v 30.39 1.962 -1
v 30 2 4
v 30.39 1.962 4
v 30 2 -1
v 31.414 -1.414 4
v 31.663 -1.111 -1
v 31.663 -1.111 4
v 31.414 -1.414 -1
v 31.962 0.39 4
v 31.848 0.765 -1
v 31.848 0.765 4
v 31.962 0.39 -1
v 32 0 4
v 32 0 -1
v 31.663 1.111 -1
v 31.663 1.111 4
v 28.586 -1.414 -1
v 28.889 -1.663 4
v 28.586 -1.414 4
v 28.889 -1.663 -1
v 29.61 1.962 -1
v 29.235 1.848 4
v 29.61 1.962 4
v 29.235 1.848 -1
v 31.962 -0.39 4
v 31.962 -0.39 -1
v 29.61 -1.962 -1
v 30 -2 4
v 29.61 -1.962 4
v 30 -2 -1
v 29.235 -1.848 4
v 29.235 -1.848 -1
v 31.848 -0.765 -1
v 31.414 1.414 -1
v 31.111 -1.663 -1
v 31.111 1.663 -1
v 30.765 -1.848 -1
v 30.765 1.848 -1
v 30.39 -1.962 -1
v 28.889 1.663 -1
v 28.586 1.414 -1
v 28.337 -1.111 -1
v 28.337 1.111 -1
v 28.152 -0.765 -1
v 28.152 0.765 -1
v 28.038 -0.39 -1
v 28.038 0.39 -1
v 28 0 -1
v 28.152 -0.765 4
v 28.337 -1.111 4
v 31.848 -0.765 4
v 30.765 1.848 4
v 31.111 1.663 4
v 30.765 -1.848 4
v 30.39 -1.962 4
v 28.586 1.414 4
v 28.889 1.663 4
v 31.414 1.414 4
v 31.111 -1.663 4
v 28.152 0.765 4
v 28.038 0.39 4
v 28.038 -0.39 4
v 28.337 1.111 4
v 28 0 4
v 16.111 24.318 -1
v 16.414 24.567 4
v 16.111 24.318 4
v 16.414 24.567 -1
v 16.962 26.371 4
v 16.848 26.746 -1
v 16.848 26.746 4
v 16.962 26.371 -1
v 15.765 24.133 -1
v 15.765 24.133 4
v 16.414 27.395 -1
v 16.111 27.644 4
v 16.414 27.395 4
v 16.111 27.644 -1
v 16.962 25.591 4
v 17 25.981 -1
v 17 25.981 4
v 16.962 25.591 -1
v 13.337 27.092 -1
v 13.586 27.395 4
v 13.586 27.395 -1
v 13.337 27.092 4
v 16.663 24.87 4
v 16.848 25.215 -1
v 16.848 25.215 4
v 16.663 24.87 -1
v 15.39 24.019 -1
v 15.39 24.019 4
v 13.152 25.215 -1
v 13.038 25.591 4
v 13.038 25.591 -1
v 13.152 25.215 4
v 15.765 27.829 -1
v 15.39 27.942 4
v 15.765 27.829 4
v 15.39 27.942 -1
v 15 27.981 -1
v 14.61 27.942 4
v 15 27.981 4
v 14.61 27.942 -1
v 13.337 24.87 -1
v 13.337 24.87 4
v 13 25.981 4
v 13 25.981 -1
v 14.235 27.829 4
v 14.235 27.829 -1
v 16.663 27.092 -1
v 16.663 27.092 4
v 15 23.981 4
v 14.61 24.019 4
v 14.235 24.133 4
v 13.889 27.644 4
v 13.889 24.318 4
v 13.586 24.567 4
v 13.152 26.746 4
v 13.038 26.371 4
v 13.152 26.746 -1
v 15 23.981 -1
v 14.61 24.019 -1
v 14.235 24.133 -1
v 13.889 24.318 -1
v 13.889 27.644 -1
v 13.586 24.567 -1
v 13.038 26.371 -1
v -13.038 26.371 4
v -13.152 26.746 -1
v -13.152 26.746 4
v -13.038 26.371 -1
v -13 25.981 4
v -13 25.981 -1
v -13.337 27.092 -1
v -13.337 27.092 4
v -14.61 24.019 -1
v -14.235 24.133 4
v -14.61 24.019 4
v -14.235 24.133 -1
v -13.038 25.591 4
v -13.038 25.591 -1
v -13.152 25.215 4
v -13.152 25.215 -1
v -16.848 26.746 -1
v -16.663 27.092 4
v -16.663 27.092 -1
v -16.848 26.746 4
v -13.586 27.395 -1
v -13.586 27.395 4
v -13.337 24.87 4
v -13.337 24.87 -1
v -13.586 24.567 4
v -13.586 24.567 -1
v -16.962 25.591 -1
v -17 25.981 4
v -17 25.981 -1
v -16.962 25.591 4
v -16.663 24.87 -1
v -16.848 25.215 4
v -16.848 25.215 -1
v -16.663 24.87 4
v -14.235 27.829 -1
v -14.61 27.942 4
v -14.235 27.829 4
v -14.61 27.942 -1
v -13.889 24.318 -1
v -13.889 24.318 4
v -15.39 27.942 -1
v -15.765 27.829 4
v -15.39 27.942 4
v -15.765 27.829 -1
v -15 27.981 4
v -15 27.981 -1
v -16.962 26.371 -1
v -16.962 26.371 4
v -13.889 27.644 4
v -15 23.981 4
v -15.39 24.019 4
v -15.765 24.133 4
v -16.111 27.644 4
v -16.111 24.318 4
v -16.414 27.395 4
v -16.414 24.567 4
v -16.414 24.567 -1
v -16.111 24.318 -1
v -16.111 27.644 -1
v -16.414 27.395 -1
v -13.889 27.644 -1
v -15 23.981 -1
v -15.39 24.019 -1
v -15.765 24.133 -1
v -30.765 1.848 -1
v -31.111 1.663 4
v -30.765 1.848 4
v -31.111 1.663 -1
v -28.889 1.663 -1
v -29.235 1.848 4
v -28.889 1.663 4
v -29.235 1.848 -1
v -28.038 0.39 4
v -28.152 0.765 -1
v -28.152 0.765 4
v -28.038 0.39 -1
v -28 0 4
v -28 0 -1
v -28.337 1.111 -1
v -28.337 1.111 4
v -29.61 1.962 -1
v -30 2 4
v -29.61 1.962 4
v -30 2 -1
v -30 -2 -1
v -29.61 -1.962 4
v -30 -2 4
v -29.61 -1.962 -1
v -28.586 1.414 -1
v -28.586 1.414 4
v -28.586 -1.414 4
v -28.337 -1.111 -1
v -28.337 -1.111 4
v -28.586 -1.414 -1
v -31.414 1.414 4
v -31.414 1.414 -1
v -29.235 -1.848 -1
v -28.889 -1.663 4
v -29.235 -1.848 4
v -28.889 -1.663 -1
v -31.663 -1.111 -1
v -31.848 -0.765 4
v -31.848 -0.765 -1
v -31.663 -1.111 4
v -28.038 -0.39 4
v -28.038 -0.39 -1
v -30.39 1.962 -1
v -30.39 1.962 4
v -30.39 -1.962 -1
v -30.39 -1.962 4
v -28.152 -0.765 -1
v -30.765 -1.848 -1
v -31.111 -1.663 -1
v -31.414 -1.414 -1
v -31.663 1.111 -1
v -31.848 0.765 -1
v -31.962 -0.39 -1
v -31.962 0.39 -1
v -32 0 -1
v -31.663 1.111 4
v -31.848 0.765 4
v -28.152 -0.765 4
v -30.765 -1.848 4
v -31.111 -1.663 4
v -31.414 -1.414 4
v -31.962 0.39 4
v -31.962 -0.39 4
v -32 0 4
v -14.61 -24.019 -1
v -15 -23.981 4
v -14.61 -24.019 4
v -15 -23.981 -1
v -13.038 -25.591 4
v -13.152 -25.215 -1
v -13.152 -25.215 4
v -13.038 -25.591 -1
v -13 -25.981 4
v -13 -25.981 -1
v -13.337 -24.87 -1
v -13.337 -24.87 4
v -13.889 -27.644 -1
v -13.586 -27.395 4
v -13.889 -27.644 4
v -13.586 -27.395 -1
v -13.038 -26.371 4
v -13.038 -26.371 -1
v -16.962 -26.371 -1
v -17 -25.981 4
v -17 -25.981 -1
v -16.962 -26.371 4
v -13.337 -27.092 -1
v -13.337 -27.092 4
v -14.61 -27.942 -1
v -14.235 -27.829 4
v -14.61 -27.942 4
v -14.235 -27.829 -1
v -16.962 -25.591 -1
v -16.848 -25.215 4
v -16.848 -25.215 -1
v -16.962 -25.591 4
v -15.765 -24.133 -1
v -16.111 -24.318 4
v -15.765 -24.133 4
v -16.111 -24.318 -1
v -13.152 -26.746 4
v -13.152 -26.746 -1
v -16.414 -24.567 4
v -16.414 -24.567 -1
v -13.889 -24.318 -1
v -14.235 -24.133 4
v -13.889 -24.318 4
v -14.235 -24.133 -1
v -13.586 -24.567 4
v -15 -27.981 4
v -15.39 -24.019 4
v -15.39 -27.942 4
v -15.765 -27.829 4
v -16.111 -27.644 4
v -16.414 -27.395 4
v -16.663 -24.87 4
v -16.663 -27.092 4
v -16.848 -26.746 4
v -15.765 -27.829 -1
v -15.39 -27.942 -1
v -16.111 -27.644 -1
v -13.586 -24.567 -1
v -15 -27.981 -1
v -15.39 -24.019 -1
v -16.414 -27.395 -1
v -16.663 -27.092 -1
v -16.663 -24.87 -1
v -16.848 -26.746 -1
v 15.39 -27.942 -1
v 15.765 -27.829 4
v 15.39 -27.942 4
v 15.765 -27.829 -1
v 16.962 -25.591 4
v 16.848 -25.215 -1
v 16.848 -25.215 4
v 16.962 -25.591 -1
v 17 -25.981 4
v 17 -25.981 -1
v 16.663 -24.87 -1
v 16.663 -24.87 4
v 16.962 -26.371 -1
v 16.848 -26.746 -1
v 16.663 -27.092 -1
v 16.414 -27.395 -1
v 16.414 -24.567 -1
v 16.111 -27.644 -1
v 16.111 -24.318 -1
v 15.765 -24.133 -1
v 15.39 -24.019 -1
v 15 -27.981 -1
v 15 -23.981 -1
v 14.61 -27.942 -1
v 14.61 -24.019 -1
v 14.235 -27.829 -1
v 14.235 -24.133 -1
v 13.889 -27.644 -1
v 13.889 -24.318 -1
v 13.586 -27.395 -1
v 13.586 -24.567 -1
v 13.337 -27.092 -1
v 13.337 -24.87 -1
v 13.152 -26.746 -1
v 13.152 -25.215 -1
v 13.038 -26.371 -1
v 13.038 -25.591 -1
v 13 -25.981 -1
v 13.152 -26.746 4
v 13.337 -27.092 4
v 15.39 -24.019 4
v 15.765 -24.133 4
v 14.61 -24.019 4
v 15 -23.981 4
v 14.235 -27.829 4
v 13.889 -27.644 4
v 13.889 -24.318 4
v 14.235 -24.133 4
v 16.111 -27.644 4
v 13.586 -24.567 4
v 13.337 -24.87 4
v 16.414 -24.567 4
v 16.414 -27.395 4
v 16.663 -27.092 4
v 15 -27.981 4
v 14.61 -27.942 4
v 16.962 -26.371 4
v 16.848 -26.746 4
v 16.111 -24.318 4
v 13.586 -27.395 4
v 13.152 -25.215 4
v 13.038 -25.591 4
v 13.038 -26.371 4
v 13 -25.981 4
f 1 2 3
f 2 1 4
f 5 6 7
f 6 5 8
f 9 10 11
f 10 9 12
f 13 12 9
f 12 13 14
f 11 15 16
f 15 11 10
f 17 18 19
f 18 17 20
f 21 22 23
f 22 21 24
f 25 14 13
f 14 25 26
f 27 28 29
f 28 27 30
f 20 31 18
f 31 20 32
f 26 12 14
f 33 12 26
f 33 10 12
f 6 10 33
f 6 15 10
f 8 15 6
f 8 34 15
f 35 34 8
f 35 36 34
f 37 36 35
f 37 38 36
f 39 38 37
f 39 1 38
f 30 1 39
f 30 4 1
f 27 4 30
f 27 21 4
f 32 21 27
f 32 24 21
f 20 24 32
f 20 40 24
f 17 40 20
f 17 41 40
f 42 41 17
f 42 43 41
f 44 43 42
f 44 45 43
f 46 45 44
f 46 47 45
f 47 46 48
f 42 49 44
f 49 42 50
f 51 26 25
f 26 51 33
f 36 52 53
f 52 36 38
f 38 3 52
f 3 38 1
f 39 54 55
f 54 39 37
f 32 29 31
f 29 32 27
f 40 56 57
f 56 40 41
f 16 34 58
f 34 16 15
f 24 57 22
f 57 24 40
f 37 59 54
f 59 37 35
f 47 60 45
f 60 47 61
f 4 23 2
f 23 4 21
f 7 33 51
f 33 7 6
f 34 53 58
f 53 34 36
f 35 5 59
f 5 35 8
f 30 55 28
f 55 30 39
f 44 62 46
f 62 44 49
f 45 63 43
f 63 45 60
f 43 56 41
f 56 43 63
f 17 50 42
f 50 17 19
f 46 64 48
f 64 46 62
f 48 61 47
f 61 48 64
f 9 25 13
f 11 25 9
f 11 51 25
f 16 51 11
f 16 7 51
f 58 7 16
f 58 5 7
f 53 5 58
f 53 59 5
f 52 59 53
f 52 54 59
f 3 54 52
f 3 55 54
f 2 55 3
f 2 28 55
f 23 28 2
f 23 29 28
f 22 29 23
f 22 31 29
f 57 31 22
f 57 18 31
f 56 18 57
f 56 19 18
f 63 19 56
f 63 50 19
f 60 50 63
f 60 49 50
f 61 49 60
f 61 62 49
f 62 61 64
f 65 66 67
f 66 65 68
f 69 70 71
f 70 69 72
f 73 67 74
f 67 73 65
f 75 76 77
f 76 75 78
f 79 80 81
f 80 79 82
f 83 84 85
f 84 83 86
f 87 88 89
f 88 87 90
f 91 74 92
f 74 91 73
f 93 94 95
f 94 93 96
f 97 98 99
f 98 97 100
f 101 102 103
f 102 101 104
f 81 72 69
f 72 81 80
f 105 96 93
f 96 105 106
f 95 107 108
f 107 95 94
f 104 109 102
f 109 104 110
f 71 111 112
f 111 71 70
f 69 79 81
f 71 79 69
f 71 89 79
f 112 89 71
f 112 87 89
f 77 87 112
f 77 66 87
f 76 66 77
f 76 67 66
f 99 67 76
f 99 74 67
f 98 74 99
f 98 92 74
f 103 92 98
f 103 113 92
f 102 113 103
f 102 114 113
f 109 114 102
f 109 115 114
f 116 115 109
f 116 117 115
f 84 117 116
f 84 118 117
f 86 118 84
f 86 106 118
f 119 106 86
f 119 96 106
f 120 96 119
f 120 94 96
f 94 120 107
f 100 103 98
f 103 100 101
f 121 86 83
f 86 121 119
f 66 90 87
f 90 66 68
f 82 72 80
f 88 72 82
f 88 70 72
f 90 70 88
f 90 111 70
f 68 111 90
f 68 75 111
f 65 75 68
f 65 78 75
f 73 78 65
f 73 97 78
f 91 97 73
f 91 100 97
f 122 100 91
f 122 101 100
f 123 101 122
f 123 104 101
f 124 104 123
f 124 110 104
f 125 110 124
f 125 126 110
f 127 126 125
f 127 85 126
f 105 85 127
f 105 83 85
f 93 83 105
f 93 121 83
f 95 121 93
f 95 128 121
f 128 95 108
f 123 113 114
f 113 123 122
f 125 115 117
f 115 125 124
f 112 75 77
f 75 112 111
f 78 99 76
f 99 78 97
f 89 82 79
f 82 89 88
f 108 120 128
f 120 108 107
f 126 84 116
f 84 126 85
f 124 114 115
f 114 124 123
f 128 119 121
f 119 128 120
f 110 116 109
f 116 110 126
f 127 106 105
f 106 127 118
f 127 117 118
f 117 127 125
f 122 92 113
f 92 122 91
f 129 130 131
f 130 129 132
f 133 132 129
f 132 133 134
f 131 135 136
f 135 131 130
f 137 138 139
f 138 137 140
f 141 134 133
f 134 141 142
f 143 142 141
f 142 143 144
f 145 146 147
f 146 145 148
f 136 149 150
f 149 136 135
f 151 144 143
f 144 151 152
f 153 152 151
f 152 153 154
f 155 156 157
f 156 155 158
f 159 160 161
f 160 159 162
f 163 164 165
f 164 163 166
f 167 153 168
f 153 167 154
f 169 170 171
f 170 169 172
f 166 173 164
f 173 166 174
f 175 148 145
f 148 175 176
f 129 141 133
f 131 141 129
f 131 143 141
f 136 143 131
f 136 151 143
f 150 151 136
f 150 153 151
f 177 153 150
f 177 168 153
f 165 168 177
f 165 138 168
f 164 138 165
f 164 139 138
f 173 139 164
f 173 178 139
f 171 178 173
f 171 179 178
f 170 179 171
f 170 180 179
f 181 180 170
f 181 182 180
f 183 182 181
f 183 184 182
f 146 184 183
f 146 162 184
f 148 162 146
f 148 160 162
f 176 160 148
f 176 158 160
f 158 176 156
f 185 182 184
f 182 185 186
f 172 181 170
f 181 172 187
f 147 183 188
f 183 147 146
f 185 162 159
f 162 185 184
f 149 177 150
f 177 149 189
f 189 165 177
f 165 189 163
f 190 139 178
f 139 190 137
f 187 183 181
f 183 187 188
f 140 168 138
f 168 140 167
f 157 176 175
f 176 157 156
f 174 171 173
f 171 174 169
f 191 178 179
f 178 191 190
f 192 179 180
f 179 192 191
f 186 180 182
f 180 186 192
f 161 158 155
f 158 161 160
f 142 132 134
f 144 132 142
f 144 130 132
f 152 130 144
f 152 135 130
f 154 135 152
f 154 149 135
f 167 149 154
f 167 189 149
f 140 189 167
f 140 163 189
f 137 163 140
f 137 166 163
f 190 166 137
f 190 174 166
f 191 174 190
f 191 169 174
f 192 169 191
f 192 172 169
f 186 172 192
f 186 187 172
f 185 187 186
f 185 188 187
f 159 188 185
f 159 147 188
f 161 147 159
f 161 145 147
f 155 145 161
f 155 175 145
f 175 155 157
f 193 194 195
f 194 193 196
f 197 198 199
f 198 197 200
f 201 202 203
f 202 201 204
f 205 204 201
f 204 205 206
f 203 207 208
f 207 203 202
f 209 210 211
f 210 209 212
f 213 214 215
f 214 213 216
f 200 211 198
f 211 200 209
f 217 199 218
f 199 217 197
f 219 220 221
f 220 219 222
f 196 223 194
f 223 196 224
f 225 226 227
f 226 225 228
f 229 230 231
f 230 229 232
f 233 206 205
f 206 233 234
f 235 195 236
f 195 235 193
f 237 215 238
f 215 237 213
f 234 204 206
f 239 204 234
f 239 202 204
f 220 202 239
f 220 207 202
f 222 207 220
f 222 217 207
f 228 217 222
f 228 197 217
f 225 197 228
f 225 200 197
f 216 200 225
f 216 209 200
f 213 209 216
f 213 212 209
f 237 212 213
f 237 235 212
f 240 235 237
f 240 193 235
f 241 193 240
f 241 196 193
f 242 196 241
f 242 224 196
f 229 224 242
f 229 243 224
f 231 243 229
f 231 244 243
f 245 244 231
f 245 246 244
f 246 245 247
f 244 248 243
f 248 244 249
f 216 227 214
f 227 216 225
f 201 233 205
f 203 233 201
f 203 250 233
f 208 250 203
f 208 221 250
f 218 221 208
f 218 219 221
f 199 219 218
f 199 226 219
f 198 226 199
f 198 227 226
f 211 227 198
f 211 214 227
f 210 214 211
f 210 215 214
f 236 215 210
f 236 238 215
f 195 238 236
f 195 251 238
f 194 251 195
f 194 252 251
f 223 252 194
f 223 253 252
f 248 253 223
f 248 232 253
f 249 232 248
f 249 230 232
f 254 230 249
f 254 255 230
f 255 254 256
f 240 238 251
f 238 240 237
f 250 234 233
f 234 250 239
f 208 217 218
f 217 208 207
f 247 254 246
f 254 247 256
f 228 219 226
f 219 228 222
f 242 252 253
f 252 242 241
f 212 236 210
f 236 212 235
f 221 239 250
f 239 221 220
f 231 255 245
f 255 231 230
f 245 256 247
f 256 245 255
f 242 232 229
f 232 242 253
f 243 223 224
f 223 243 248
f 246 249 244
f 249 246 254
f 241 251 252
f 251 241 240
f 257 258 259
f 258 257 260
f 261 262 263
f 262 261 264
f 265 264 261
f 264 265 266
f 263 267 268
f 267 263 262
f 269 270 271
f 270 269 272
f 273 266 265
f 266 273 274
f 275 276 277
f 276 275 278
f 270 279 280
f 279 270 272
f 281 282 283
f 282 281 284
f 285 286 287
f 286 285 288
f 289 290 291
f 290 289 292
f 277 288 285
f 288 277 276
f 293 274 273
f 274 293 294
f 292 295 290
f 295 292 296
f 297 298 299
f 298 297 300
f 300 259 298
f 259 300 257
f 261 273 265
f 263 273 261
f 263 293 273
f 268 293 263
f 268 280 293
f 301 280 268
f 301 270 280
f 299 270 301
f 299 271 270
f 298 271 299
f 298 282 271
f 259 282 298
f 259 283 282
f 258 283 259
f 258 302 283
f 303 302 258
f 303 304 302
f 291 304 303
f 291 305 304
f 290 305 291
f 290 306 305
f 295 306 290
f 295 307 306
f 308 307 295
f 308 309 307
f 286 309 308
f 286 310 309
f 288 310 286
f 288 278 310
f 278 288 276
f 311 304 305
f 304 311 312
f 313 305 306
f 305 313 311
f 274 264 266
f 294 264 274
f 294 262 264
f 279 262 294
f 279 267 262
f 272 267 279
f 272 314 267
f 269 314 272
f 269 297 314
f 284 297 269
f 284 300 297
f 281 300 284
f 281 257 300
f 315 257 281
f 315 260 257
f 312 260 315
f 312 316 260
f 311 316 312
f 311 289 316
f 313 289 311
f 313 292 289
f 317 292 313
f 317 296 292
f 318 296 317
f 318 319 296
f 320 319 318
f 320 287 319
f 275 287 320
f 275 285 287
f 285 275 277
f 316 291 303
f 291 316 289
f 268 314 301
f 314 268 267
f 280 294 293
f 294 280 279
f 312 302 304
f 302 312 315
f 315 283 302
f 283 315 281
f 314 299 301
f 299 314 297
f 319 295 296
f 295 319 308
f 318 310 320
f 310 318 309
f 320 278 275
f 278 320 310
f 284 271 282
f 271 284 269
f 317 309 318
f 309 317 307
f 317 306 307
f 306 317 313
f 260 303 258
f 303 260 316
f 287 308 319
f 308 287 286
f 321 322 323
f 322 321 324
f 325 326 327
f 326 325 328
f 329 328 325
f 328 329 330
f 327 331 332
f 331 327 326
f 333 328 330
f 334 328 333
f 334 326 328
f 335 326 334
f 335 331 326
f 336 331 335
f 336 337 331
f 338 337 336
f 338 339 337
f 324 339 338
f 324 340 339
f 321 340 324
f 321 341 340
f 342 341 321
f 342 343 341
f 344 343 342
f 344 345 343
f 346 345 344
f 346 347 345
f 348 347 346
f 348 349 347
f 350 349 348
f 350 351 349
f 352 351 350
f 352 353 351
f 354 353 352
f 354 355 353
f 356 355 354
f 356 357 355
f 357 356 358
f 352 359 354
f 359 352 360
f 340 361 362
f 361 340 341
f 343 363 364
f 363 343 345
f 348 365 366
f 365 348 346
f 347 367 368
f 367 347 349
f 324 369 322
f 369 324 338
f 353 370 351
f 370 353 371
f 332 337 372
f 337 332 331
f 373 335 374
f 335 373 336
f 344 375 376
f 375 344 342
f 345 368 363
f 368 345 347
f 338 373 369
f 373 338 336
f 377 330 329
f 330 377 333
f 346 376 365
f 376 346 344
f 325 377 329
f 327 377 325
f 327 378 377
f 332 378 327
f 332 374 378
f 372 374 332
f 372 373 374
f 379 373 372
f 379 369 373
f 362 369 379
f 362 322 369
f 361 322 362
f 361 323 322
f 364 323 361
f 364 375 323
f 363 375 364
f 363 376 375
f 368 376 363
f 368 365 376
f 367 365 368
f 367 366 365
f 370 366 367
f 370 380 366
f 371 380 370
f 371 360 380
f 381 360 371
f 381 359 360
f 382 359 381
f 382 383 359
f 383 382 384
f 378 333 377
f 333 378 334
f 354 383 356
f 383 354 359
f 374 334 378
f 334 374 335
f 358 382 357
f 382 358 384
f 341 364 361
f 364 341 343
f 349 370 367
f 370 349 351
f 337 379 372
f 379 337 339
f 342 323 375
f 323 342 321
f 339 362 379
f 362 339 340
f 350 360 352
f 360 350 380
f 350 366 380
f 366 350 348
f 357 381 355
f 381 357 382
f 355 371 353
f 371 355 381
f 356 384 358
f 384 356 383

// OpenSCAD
// file: ../modules/base.scad
module drainage_holes(count, diameter, placement_radius, floor_thickness) {
    for (i = [0 : count - 1]) {
        angle = i * 360 / count;
        translate([placement_radius * cos(angle), placement_radius * sin(angle), -1])
            cylinder(h = floor_thickness + 2, d = diameter, $fn = 32);
    }
}
// main file
include <../modules/base.scad>
// Smoke-test only: confirm the module exists and renders without error.
drainage_holes(6, 4, 30, 3);
